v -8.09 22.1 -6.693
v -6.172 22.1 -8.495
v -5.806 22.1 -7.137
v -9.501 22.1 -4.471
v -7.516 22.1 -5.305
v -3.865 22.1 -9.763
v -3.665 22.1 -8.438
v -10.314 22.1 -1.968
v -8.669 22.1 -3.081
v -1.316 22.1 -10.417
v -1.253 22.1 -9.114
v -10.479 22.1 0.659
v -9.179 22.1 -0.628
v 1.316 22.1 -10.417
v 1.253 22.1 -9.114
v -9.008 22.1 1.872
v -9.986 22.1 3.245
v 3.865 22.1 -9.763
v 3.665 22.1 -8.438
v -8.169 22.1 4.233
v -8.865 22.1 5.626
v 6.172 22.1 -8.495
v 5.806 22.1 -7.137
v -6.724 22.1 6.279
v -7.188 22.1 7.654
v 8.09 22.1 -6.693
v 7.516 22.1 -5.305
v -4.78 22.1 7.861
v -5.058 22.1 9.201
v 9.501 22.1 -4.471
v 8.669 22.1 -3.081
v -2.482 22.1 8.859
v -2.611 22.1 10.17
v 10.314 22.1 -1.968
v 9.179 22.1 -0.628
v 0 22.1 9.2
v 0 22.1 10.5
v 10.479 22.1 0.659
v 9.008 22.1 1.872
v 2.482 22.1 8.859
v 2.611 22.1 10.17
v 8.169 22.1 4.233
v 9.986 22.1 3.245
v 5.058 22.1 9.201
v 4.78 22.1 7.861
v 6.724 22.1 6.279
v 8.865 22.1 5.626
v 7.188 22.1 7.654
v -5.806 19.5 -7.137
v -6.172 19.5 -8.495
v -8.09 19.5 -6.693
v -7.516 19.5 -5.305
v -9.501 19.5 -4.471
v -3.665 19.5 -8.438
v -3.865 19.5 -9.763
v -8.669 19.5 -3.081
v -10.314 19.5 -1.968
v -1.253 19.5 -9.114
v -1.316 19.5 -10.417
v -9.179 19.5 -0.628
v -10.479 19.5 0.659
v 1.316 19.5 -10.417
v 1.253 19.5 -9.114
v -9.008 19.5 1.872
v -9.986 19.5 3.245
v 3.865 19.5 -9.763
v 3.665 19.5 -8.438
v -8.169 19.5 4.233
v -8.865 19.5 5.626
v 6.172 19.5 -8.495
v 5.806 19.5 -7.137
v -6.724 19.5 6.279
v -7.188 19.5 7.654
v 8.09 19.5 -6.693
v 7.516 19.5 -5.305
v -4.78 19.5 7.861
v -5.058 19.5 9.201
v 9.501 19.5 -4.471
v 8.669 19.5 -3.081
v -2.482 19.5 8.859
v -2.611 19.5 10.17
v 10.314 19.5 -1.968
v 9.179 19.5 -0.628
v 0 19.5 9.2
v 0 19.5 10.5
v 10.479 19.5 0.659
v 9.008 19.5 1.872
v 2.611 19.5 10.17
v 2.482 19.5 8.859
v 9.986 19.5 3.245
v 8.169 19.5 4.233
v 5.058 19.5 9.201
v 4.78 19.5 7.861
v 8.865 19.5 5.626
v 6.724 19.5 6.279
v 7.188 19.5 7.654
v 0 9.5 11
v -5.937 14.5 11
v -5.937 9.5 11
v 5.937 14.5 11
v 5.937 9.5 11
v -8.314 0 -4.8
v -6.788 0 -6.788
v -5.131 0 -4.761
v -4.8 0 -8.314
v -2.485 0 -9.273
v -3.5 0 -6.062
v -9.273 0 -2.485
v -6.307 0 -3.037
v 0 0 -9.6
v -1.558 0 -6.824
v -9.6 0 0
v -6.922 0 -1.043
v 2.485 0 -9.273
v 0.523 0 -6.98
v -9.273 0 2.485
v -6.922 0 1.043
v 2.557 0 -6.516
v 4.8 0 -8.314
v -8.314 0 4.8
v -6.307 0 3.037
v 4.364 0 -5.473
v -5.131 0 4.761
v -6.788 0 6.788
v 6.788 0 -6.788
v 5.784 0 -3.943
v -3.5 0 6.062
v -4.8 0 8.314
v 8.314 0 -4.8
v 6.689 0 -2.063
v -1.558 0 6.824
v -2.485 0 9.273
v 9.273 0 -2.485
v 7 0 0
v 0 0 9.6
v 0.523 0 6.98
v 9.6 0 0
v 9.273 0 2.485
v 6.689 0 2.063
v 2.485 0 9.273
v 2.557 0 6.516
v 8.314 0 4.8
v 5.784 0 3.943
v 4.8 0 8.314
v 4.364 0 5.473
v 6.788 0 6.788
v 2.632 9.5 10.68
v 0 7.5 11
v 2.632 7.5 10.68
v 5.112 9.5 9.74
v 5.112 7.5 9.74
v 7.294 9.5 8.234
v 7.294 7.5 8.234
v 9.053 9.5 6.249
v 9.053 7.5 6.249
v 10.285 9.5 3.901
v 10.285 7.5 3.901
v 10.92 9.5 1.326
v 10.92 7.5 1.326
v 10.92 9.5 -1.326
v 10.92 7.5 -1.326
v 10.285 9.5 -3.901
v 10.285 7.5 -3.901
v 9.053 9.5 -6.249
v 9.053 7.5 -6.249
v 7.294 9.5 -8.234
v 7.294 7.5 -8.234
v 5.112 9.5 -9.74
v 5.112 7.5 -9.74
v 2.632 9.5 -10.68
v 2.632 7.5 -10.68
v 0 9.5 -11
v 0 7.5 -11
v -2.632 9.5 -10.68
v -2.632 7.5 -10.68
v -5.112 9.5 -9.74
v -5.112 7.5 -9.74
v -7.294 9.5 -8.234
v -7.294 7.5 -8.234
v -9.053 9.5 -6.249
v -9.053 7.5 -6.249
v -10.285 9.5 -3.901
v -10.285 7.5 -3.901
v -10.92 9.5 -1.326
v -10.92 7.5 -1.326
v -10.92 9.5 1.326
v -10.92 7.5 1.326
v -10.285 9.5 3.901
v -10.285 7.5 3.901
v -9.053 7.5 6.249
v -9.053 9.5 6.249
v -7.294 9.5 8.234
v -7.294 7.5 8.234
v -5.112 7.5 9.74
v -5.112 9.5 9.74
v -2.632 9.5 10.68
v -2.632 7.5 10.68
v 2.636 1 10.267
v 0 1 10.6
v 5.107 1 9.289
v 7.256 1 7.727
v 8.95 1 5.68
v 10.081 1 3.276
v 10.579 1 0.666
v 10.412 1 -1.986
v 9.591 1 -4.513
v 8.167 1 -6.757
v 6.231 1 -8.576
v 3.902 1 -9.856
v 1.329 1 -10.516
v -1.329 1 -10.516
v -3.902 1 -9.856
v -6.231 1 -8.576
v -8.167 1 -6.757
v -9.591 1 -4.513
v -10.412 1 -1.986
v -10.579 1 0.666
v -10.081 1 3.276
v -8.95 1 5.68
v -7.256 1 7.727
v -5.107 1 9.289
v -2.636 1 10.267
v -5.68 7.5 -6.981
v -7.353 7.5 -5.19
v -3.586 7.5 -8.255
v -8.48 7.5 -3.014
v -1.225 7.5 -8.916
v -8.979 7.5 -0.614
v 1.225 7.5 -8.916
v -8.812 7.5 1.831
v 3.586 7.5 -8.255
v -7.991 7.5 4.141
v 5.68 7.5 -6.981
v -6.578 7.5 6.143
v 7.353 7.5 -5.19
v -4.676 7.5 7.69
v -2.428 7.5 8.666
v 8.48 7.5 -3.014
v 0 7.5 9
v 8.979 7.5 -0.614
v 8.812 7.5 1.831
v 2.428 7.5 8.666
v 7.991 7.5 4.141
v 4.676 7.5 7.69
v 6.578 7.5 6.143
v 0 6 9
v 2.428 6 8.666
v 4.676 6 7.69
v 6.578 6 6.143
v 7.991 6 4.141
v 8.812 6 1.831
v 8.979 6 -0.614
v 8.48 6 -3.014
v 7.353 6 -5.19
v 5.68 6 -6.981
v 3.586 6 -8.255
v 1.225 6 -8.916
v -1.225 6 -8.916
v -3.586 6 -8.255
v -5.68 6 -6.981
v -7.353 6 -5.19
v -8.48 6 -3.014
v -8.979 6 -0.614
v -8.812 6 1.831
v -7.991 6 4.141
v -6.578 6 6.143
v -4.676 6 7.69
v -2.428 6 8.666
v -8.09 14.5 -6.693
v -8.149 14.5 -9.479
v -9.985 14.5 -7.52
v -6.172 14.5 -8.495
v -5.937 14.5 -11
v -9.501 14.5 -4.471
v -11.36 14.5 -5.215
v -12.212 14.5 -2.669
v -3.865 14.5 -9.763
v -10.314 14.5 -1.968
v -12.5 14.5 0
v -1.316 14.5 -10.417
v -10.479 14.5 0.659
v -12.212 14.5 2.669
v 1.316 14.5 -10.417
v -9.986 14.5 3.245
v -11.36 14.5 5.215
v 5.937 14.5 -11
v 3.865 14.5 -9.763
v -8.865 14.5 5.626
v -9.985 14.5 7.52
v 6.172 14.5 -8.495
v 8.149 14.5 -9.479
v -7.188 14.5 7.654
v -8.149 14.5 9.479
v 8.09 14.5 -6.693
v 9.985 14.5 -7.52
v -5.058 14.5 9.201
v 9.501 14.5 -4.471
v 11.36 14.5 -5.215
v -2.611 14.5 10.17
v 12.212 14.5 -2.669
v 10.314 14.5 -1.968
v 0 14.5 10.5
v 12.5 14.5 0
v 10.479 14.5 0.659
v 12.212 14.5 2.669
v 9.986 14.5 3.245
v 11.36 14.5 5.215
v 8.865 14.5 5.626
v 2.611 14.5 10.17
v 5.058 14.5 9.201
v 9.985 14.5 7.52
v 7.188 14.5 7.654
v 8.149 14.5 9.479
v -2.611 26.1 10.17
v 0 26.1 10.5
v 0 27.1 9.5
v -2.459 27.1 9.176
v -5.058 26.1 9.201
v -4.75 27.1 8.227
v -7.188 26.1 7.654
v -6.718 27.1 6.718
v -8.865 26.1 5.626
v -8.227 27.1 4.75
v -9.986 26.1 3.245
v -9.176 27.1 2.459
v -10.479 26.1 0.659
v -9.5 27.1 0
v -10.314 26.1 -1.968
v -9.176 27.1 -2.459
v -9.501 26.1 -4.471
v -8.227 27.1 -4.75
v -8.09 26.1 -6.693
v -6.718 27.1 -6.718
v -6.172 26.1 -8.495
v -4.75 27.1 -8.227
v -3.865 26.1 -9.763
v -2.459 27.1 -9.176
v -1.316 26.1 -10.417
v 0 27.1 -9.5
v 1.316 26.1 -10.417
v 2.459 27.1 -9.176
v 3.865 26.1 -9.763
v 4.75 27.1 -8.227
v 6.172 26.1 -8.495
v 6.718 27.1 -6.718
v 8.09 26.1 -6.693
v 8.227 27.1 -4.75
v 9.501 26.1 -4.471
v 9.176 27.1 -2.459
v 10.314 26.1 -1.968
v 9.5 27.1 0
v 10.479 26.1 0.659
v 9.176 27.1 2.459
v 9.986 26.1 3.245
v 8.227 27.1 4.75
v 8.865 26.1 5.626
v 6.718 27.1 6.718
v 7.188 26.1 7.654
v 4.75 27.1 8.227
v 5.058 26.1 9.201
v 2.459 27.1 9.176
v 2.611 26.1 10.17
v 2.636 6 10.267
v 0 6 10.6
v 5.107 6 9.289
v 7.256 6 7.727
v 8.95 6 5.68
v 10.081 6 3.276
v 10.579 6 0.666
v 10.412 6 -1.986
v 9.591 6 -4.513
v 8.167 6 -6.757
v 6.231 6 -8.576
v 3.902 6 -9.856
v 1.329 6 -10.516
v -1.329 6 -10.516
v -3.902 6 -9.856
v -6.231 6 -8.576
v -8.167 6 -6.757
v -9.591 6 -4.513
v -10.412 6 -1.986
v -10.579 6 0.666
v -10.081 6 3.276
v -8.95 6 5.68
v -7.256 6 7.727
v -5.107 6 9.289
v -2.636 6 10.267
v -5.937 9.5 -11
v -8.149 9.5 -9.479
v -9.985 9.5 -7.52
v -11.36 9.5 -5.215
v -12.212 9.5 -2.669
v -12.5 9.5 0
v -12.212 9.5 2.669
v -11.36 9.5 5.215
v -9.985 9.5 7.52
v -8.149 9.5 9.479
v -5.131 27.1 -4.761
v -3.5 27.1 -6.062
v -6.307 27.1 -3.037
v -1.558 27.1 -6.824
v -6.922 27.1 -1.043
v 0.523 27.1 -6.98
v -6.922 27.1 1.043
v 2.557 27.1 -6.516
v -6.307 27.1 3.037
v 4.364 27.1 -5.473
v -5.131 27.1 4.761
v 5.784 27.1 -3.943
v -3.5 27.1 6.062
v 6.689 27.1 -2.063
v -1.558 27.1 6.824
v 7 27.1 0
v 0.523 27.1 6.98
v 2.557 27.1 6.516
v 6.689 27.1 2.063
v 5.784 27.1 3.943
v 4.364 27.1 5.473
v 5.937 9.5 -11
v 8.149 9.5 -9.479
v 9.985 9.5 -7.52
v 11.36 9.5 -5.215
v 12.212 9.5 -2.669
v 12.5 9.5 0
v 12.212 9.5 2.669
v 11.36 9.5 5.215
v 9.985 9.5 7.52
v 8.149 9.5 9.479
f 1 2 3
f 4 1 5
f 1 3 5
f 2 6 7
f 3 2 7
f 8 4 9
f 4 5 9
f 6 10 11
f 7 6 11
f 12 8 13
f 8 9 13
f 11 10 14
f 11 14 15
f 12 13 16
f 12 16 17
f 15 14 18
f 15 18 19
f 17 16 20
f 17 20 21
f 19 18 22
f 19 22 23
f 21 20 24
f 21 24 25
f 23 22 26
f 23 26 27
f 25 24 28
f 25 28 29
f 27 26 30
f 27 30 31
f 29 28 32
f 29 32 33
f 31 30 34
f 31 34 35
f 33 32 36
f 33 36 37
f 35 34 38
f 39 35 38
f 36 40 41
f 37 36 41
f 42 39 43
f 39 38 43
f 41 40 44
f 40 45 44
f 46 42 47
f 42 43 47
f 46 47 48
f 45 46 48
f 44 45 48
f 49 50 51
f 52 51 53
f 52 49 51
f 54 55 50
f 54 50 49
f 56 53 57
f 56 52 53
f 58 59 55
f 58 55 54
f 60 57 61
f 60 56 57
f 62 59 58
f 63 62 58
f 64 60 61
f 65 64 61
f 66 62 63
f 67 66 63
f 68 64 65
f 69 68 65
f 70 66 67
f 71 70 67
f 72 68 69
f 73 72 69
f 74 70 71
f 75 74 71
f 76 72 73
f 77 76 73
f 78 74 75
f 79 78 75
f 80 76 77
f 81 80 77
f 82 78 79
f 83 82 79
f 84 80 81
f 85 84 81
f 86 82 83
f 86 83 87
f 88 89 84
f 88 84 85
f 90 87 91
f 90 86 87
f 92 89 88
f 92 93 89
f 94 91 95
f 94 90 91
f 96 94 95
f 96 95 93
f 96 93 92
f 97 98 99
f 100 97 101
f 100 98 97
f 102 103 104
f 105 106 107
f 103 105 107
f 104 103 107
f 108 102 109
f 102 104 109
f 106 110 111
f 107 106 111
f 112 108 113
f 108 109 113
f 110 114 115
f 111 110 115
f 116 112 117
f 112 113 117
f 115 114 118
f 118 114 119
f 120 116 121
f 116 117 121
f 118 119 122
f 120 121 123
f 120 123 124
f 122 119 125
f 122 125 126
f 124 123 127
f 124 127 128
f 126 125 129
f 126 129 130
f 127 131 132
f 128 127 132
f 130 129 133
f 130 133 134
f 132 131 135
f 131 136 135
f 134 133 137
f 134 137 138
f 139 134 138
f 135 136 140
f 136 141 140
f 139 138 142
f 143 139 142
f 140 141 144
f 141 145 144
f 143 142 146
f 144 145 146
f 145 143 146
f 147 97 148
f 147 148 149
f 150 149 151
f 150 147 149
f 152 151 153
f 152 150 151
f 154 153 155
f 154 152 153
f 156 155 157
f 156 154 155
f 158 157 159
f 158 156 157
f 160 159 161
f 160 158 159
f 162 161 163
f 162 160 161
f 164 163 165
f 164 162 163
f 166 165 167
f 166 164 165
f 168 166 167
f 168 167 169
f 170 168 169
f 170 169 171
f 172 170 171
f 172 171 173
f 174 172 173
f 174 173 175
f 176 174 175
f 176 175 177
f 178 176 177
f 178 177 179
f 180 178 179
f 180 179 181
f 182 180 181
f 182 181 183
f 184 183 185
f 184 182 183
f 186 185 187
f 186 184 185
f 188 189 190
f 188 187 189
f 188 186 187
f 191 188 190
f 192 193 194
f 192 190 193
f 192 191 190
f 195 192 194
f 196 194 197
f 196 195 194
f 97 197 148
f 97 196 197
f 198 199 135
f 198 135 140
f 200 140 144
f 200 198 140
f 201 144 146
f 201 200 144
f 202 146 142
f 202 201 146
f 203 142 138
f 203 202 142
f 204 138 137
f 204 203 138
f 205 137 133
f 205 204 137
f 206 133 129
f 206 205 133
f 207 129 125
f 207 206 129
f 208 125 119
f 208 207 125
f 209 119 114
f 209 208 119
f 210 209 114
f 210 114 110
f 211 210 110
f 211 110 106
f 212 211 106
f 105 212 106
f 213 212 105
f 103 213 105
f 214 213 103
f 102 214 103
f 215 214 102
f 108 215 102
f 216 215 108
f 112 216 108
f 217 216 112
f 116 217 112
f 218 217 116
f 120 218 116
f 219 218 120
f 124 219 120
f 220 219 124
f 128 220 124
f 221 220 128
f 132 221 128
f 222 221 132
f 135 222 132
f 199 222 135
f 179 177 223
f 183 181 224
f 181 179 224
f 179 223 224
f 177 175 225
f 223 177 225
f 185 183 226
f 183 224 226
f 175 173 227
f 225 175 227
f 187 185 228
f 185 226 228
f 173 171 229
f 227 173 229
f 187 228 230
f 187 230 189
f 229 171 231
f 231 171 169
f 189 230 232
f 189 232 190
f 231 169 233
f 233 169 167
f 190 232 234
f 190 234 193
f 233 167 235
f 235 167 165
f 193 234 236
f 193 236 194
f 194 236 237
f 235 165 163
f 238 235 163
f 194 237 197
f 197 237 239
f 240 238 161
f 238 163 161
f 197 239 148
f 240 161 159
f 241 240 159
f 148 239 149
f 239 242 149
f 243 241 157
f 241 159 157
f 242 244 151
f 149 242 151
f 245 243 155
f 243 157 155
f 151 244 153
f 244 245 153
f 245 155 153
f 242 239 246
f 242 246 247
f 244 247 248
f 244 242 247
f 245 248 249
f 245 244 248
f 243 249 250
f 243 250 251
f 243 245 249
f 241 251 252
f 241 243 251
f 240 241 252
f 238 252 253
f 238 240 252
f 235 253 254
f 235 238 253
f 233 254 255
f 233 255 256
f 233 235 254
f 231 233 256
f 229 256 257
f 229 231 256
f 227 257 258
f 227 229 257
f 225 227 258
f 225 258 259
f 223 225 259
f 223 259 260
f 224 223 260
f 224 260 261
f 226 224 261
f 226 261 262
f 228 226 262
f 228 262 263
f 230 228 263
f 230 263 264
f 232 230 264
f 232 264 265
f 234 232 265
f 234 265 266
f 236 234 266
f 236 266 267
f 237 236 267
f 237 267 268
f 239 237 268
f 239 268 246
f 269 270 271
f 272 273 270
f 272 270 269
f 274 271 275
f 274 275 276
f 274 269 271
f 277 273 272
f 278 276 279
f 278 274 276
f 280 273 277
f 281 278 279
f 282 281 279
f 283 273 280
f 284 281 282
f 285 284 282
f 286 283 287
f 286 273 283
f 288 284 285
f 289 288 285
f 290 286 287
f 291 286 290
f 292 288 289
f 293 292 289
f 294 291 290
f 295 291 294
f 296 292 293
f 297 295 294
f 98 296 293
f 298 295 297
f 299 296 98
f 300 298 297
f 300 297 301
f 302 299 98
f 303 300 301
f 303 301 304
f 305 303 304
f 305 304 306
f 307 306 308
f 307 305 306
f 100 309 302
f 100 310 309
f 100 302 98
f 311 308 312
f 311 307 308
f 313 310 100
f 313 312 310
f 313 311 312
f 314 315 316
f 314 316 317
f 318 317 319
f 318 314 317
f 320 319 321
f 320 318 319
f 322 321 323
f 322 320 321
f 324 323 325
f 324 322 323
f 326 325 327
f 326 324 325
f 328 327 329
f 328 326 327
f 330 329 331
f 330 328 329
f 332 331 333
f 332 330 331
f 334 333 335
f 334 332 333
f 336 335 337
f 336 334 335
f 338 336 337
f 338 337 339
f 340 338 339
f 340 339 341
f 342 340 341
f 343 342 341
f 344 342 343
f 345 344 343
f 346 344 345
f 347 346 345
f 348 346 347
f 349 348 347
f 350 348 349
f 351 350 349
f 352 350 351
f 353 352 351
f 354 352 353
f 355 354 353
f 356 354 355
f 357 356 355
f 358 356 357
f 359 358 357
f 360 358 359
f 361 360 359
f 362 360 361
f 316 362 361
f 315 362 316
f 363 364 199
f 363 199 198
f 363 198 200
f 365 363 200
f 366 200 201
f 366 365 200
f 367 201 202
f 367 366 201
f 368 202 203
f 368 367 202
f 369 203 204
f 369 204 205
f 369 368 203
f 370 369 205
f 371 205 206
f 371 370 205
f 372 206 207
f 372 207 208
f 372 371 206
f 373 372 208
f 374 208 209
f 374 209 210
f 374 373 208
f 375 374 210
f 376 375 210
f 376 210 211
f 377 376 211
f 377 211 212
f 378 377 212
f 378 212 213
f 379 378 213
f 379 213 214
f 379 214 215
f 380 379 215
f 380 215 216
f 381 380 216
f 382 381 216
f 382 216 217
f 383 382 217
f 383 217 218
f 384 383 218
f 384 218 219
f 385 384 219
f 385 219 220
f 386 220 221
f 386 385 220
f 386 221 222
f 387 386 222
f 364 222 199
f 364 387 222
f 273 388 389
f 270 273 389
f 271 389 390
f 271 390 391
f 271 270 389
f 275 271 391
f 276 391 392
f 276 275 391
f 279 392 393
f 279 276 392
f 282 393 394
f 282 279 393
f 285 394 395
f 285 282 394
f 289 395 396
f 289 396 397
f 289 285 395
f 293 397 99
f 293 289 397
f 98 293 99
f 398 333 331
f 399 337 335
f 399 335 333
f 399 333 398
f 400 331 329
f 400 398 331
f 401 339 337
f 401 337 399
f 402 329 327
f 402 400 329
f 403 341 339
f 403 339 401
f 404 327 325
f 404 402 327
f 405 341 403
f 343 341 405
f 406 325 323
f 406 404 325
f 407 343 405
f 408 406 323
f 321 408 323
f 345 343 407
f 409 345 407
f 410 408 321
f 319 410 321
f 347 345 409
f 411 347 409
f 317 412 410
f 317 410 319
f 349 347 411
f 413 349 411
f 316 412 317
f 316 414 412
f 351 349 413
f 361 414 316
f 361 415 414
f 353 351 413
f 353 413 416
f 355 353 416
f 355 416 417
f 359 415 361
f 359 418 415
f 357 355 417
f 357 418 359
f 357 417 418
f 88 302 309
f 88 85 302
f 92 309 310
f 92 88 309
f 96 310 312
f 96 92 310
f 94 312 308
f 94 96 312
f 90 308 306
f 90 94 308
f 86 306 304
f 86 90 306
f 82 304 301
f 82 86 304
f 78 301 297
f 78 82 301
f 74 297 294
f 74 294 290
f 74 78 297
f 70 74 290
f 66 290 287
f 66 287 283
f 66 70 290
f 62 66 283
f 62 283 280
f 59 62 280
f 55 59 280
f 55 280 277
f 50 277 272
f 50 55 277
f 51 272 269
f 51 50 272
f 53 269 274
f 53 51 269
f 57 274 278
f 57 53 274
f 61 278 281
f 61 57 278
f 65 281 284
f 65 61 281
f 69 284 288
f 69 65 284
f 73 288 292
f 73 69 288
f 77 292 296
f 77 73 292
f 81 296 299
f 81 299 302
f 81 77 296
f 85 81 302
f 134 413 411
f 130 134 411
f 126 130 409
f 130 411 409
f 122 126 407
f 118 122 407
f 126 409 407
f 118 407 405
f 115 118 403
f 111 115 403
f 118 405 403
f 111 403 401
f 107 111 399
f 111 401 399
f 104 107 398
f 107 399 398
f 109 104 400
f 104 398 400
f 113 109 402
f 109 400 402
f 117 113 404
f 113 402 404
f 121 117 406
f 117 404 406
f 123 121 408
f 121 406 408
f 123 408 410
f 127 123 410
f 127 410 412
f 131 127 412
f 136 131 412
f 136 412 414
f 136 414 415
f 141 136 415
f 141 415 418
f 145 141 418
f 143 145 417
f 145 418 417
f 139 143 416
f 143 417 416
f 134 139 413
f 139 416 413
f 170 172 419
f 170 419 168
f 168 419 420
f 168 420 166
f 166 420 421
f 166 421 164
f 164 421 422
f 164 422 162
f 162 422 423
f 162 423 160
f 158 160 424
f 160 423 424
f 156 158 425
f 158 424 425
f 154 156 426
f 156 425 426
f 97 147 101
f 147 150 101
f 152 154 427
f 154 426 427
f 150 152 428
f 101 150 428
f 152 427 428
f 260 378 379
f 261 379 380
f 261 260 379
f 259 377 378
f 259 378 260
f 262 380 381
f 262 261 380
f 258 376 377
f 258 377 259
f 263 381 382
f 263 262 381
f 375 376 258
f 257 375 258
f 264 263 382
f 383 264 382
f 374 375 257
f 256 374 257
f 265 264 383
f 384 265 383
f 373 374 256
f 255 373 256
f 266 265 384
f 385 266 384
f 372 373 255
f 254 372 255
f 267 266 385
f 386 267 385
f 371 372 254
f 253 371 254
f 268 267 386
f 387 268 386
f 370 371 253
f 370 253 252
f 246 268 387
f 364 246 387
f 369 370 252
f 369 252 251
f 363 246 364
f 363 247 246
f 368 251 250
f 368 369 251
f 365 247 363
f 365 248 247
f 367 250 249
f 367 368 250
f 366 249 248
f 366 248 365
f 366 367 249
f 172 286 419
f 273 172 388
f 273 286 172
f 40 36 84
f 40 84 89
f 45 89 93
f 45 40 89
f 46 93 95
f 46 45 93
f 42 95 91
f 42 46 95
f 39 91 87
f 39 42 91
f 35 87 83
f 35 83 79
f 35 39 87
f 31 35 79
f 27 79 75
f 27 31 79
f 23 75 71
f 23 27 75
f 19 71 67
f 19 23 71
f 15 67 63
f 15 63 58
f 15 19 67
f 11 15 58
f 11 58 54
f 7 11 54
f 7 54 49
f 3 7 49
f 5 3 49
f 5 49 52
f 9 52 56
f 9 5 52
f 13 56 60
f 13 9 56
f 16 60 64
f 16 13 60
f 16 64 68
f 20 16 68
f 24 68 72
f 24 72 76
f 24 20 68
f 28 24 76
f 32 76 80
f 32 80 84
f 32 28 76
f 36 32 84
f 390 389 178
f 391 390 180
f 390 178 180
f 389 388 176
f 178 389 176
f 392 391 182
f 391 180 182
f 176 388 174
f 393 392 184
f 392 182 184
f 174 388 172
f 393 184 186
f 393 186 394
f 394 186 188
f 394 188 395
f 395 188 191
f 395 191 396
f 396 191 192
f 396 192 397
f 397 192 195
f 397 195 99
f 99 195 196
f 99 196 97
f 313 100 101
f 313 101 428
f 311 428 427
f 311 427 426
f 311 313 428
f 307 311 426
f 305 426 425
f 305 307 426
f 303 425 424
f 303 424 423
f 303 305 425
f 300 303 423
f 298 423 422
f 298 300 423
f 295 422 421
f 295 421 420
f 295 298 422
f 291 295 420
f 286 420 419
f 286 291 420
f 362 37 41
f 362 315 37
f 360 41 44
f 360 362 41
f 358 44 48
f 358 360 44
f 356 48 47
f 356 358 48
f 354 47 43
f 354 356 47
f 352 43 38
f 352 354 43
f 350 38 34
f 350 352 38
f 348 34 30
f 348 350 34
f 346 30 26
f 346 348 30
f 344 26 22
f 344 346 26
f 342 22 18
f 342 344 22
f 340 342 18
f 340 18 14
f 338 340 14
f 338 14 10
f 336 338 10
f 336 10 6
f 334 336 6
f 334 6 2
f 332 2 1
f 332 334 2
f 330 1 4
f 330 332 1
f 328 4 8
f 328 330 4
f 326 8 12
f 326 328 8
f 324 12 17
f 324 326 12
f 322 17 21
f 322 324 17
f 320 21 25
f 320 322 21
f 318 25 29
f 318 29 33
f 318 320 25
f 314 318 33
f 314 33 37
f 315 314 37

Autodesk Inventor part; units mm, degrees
ref_plane "YZ Plane" through (0, 0, 0) normal (1, 0, 0) x (0, 1, 0)
ref_plane "XZ Plane" through (0, 0, 0) normal (0, 1, 0) x (-1, 0, 0)
ref_plane "XY Plane" through (0, 0, 0) normal (0, 0, 1) x (1, 0, 0)
sketch "Sketch1" plane through (0, 0, 0) normal (1, 0, 0) x (0, 1, 0)
  line L0 (0, 0) -> (0, 10.6)
  line L1 (0, 10.6) -> (6, 10.6)
  line L2 (6, 0) -> (6, 9) construction
  line L3 (6, 10.6) -> (6, 9)
  line L4 (6, 9) -> (7.5, 9)
  line L5 (7.5, 9) -> (7.5, 11)
  line L6 (7.5, 11) -> (9.5, 11)
  line L7 (9.5, 11) -> (9.5, 12.5)
  line L8 (9.5, 11) -> (11, 11) construction
  line L9 (9.5, 12.5) -> (14.5, 12.5)
  line L10 (14.5, 0) -> (14.5, 10.5) construction
  line L11 (14.5, 12.5) -> (14.5, 10.5)
  line L12 (14.5, 10.5) -> (19.5, 10.5)
  line L13 (19.5, 0) -> (19.5, 9.2) construction
  line L14 (19.5, 10.5) -> (19.5, 9.2)
  line L15 (19.5, 9.2) -> (22.1, 9.2)
  line L16 (22.1, 9.2) -> (22.1, 10.5)
  line L17 (22.1, 10.5) -> (27.1, 10.5)
  line L18 (27.1, 10.5) -> (27.1, 0)
  line L19 (0, 0) -> (27.1, 0)
  dimension "d0" = 10.6
  dimension "d1" = 6
  dimension "d2" = 9
  dimension "d3" = 1.5
  dimension "d4" = 2
  dimension "d5" = 2
  dimension "d7" = 11
  dimension "d8" = 1.5
  dimension "d9" = 90
  dimension "d10" = 5
  dimension "d11" = 10.5
  dimension "d12" = 2
  dimension "d13" = 5
  dimension "d14" = 9.2
  dimension "d15" = 1.3
  dimension "d16" = 2.6
  dimension "d17" = 1.3
  dimension "d18" = 5
revolve "Revolution1" add sketch "Sketch1" angle 360 about axis through (0, 0, 0) along (0, 1, 0)
thread "Thread1" size "M22x1.5" class "6g" standard "ANSI Metric M Profile" full length
chamfer "Chamfer1" distance 1 angle 45 1 edges at (0, 0, -10.6)
sketch "Sketch2" plane through (0, 27.1, 0) normal (0, 1, 0) x (1, 0, 0)
  circle A0 centre (0, 0) radius 7
  dimension "d25" = 14
extrude "Extrusion1" cut sketch "Sketch2" against normal through all
chamfer "Chamfer2" distance 1 angle 45 1 edges at (0, 27.1, -10.5)
sketch "Sketch3" plane through (0, 14.5, 0) normal (0, 1, 0) x (1, 0, 0)
  circle A0 centre (0, 0) radius 11
  circle A1 centre (0, 0) radius 11 projected
  line L0 (0, 11) -> (-7.7224, 11)
  line L1 (-7.7224, 11) -> (-7.7224, 13.1204)
  line L2 (-7.7224, 13.1204) -> (0, 13.1204)
  line L3 (0, 13.1204) -> (0, 11)
  line L4 (0, 11) -> (7.8373, 11)
  line L5 (7.8373, 11) -> (7.8373, 13.1204)
  line L6 (7.8373, 13.1204) -> (0, 13.1204)
  line L7 (0, 13.1204) -> (0, 11)
  line L8 (0, -11) -> (-7.4786, -11)
  line L9 (-7.4786, -11) -> (-7.4786, -12.6458)
  line L10 (-7.4786, -12.6458) -> (0, -12.6458)
  line L11 (0, -12.6458) -> (0, -11)
  line L12 (0, -11) -> (7.7134, -11)
  line L13 (7.7134, -11) -> (7.7134, -12.6458)
  line L14 (7.7134, -12.6458) -> (0, -12.6458)
  line L15 (0, -12.6458) -> (0, -11)
  dimension "d31" = 22
extrude "Extrusion2" cut sketch "Sketch3" against normal through all contours L12 L13 L14 L11 | L11 L10 L9 L8 | L0 L1 L2 L3 | L3 L6 L5 L4
properties part number "Corrugated tube-Flowmeter connector" material "Polypropylene"
